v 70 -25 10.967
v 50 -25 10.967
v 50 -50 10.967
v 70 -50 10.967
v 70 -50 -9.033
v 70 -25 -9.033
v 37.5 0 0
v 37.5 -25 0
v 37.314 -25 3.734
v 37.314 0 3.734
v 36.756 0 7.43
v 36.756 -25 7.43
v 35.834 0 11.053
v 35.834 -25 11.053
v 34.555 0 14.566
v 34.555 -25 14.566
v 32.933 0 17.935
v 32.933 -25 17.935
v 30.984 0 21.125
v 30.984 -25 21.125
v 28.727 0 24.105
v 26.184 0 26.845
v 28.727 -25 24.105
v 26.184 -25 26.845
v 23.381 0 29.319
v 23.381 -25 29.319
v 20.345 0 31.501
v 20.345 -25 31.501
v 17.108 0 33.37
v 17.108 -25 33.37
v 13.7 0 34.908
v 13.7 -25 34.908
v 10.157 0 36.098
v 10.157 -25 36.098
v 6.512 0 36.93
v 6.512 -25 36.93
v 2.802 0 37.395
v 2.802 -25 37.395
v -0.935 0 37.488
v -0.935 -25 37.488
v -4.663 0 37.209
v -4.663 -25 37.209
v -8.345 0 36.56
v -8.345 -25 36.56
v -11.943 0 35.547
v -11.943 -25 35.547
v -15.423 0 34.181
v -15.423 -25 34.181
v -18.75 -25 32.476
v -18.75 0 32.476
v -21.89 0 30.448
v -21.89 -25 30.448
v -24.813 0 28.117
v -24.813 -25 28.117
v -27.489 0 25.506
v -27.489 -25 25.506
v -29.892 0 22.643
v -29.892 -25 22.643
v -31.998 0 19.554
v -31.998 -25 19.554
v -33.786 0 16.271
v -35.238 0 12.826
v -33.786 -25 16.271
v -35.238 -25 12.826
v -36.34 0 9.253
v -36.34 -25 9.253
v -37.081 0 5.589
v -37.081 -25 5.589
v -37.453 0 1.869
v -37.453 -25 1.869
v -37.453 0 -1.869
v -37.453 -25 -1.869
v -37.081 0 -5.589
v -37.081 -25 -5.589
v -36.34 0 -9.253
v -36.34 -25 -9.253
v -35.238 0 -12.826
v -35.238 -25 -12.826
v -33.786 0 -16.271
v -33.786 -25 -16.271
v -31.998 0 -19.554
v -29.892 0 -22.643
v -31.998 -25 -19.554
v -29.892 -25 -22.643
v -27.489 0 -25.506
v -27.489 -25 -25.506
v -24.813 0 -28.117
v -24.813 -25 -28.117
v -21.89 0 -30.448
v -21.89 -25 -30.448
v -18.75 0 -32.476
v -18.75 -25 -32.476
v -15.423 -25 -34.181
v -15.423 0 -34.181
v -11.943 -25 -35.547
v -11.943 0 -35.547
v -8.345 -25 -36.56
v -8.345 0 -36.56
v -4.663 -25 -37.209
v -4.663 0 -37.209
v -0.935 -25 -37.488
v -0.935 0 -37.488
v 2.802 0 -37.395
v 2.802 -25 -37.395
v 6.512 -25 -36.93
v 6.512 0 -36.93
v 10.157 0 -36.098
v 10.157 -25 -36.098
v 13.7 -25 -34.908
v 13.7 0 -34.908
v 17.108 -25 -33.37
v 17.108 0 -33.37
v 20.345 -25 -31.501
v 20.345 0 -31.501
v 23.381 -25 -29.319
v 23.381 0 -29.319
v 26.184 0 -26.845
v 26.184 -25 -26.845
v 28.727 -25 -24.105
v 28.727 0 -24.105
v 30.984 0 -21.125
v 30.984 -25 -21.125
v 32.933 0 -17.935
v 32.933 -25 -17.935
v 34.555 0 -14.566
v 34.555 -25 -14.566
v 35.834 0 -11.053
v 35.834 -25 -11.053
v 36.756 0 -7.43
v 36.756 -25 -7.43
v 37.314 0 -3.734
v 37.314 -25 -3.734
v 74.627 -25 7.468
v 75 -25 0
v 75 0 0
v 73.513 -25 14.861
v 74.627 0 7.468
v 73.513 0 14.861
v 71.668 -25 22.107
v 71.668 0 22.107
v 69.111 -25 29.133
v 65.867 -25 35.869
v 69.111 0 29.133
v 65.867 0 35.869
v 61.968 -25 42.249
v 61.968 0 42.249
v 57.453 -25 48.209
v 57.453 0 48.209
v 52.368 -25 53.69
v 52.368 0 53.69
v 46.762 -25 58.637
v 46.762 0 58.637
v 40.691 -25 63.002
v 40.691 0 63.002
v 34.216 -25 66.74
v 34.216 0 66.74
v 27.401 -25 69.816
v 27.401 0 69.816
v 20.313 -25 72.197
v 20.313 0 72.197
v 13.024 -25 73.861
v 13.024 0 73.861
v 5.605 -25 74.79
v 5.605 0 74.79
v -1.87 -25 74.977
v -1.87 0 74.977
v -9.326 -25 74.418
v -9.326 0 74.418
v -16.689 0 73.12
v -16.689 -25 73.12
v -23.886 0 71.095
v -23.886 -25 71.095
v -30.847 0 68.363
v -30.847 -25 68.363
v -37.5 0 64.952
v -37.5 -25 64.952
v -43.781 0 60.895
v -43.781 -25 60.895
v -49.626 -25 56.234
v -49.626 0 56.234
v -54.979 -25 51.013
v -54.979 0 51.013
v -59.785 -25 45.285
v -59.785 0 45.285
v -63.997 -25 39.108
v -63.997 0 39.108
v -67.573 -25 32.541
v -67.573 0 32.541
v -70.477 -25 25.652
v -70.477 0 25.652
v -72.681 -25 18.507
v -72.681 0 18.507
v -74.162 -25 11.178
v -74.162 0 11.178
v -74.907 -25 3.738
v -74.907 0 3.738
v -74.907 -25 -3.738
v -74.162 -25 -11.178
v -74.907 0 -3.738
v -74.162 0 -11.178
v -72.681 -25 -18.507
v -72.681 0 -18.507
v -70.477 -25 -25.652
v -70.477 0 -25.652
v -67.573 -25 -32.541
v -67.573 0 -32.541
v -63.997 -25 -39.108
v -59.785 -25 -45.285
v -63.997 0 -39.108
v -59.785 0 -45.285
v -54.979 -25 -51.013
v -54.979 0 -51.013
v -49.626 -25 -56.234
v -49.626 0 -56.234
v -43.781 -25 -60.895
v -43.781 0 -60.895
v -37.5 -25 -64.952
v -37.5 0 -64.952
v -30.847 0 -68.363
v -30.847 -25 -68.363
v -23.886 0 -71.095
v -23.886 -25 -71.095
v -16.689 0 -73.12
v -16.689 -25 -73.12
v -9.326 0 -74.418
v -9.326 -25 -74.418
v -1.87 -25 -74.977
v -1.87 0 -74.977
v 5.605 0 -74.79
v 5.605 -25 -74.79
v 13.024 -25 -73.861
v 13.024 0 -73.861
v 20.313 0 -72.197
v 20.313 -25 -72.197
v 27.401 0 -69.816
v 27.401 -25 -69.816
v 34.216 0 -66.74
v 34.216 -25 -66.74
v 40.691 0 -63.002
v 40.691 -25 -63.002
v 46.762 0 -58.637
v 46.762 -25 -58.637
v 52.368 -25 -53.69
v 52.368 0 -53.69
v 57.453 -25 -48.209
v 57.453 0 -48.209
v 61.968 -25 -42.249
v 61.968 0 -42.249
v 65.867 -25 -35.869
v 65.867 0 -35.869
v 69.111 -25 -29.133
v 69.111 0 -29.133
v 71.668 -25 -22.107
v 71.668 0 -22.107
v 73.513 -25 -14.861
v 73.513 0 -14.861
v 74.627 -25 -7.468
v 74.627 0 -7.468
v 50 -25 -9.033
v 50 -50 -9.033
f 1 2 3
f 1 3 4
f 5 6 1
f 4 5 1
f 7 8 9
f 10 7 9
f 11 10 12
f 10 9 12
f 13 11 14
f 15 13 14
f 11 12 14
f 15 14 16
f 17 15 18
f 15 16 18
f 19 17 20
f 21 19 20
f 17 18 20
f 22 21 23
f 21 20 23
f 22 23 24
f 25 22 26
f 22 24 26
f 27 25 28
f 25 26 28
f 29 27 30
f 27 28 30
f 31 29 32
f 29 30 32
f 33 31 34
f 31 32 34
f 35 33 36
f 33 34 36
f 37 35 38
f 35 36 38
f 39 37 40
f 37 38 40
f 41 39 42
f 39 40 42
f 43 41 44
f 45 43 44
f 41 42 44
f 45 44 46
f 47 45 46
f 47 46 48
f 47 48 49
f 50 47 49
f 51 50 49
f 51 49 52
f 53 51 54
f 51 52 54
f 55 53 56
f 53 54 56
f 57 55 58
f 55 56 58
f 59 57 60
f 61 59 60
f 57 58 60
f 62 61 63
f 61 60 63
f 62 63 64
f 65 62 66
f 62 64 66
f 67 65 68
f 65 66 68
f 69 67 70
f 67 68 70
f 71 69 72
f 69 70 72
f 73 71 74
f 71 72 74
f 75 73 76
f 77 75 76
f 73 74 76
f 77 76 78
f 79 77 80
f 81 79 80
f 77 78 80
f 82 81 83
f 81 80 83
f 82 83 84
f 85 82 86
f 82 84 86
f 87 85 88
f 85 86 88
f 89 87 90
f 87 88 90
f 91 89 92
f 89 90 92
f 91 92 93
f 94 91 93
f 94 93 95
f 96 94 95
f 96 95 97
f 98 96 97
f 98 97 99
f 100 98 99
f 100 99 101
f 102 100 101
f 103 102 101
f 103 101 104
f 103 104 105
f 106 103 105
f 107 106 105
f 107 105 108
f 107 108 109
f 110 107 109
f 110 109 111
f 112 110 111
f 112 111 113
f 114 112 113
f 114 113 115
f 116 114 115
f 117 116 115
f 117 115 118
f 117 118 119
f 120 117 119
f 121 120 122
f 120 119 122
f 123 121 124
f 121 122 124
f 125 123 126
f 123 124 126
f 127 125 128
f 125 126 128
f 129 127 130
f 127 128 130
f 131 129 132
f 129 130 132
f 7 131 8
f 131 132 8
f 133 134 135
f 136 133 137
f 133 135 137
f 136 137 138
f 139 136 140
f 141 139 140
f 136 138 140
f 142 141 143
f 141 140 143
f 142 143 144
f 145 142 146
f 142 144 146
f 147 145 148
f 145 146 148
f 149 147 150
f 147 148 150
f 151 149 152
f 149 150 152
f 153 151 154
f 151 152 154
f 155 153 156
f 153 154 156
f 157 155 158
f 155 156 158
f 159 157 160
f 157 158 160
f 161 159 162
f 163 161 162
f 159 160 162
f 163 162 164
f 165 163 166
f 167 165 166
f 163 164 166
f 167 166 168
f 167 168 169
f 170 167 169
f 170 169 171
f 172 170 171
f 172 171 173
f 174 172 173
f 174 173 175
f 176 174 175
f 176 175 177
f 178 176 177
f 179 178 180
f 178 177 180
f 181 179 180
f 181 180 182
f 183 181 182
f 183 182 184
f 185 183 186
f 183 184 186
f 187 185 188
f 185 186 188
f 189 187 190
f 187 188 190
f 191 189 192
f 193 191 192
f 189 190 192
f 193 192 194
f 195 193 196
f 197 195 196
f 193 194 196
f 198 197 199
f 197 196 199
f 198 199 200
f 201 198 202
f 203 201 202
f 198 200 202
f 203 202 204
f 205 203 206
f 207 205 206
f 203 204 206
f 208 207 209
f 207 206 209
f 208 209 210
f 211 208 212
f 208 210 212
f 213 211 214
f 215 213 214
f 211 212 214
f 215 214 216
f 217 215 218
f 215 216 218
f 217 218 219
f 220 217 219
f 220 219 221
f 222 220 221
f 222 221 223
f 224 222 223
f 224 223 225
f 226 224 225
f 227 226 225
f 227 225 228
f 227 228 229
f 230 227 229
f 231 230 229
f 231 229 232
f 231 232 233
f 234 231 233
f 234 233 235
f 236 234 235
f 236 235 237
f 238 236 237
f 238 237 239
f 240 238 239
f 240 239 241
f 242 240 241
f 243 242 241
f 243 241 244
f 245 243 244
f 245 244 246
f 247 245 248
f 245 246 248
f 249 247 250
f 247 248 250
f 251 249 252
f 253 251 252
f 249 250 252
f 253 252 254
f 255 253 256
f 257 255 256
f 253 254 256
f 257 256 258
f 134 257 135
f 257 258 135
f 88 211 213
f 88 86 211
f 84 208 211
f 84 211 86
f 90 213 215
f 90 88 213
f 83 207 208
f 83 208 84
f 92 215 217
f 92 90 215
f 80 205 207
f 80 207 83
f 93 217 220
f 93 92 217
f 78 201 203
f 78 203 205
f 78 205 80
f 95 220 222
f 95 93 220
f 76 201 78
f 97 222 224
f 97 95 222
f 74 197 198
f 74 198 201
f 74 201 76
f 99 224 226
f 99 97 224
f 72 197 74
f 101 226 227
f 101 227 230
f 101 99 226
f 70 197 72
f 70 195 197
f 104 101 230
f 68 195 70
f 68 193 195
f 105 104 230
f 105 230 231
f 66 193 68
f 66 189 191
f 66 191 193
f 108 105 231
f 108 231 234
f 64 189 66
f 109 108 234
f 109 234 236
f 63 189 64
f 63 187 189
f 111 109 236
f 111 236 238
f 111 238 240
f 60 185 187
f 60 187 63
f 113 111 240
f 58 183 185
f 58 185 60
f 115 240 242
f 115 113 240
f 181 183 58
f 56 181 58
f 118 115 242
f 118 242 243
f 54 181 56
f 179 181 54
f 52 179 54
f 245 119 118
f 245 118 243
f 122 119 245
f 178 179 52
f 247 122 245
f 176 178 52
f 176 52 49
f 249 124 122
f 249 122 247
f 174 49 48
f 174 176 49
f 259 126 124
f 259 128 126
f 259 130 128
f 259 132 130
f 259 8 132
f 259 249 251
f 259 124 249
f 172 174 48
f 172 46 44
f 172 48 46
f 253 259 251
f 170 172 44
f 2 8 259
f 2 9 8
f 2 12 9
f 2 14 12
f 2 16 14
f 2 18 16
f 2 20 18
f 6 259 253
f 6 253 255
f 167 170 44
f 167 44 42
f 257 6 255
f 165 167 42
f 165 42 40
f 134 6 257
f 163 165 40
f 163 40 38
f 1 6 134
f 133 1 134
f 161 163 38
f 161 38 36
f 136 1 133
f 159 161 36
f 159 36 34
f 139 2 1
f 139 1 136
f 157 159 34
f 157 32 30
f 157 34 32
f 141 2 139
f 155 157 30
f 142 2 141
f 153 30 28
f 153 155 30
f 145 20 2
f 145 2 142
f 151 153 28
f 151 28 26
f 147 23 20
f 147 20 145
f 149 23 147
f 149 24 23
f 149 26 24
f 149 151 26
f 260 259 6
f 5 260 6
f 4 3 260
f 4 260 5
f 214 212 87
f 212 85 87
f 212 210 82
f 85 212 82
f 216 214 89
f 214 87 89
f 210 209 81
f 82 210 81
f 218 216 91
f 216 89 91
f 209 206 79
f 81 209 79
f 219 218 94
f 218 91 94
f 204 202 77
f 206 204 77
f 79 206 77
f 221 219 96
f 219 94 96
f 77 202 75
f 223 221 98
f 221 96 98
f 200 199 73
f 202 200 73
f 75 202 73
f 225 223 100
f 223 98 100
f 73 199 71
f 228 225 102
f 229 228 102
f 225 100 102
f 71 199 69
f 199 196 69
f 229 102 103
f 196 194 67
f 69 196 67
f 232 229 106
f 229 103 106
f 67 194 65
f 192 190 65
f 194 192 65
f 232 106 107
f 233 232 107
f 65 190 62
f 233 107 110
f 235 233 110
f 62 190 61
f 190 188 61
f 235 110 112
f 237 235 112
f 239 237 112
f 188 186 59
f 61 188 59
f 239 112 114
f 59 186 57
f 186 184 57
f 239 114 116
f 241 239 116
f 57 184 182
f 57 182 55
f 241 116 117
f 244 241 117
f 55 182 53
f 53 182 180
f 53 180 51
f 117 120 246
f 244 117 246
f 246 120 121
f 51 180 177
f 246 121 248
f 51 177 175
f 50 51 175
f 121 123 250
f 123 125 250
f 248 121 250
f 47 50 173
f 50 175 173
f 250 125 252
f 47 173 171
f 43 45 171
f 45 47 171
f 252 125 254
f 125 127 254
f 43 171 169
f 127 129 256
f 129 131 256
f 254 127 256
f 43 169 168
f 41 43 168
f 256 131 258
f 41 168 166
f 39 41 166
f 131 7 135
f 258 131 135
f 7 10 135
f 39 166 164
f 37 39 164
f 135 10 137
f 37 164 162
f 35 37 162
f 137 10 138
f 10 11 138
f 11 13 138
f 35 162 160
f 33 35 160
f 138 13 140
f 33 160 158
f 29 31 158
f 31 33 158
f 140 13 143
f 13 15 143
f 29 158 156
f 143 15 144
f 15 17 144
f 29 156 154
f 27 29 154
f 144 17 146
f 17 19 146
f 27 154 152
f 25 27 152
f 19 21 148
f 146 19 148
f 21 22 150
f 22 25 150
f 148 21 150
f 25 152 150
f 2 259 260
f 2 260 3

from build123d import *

# Parameters (mm, degrees)
F0_R     = 75
F1_DEPTH = 25
F2_R     = 37.5
F3_DEPTH = 25
F4_W     = 20
F4_H     = 20
F5_DEPTH = 25


with BuildPart() as f1:
    # F0 (on Front) → F1 (new body)
    with BuildSketch(Plane.XZ):
        Circle(F0_R)
    extrude(amount=F1_DEPTH)

    # F2 (on face) → F3 (cut)
    with BuildSketch(Plane.XZ.offset(25)):
        Circle(F2_R)
    extrude(amount=-F3_DEPTH, mode=Mode.SUBTRACT)

    # F4 (on face) → F5 (join)
    with BuildSketch(Plane.XZ.offset(25)):
        with Locations((60, 0.96703)):
            Rectangle(F4_W, F4_H)
    extrude(amount=F5_DEPTH)


solid = f1.part
